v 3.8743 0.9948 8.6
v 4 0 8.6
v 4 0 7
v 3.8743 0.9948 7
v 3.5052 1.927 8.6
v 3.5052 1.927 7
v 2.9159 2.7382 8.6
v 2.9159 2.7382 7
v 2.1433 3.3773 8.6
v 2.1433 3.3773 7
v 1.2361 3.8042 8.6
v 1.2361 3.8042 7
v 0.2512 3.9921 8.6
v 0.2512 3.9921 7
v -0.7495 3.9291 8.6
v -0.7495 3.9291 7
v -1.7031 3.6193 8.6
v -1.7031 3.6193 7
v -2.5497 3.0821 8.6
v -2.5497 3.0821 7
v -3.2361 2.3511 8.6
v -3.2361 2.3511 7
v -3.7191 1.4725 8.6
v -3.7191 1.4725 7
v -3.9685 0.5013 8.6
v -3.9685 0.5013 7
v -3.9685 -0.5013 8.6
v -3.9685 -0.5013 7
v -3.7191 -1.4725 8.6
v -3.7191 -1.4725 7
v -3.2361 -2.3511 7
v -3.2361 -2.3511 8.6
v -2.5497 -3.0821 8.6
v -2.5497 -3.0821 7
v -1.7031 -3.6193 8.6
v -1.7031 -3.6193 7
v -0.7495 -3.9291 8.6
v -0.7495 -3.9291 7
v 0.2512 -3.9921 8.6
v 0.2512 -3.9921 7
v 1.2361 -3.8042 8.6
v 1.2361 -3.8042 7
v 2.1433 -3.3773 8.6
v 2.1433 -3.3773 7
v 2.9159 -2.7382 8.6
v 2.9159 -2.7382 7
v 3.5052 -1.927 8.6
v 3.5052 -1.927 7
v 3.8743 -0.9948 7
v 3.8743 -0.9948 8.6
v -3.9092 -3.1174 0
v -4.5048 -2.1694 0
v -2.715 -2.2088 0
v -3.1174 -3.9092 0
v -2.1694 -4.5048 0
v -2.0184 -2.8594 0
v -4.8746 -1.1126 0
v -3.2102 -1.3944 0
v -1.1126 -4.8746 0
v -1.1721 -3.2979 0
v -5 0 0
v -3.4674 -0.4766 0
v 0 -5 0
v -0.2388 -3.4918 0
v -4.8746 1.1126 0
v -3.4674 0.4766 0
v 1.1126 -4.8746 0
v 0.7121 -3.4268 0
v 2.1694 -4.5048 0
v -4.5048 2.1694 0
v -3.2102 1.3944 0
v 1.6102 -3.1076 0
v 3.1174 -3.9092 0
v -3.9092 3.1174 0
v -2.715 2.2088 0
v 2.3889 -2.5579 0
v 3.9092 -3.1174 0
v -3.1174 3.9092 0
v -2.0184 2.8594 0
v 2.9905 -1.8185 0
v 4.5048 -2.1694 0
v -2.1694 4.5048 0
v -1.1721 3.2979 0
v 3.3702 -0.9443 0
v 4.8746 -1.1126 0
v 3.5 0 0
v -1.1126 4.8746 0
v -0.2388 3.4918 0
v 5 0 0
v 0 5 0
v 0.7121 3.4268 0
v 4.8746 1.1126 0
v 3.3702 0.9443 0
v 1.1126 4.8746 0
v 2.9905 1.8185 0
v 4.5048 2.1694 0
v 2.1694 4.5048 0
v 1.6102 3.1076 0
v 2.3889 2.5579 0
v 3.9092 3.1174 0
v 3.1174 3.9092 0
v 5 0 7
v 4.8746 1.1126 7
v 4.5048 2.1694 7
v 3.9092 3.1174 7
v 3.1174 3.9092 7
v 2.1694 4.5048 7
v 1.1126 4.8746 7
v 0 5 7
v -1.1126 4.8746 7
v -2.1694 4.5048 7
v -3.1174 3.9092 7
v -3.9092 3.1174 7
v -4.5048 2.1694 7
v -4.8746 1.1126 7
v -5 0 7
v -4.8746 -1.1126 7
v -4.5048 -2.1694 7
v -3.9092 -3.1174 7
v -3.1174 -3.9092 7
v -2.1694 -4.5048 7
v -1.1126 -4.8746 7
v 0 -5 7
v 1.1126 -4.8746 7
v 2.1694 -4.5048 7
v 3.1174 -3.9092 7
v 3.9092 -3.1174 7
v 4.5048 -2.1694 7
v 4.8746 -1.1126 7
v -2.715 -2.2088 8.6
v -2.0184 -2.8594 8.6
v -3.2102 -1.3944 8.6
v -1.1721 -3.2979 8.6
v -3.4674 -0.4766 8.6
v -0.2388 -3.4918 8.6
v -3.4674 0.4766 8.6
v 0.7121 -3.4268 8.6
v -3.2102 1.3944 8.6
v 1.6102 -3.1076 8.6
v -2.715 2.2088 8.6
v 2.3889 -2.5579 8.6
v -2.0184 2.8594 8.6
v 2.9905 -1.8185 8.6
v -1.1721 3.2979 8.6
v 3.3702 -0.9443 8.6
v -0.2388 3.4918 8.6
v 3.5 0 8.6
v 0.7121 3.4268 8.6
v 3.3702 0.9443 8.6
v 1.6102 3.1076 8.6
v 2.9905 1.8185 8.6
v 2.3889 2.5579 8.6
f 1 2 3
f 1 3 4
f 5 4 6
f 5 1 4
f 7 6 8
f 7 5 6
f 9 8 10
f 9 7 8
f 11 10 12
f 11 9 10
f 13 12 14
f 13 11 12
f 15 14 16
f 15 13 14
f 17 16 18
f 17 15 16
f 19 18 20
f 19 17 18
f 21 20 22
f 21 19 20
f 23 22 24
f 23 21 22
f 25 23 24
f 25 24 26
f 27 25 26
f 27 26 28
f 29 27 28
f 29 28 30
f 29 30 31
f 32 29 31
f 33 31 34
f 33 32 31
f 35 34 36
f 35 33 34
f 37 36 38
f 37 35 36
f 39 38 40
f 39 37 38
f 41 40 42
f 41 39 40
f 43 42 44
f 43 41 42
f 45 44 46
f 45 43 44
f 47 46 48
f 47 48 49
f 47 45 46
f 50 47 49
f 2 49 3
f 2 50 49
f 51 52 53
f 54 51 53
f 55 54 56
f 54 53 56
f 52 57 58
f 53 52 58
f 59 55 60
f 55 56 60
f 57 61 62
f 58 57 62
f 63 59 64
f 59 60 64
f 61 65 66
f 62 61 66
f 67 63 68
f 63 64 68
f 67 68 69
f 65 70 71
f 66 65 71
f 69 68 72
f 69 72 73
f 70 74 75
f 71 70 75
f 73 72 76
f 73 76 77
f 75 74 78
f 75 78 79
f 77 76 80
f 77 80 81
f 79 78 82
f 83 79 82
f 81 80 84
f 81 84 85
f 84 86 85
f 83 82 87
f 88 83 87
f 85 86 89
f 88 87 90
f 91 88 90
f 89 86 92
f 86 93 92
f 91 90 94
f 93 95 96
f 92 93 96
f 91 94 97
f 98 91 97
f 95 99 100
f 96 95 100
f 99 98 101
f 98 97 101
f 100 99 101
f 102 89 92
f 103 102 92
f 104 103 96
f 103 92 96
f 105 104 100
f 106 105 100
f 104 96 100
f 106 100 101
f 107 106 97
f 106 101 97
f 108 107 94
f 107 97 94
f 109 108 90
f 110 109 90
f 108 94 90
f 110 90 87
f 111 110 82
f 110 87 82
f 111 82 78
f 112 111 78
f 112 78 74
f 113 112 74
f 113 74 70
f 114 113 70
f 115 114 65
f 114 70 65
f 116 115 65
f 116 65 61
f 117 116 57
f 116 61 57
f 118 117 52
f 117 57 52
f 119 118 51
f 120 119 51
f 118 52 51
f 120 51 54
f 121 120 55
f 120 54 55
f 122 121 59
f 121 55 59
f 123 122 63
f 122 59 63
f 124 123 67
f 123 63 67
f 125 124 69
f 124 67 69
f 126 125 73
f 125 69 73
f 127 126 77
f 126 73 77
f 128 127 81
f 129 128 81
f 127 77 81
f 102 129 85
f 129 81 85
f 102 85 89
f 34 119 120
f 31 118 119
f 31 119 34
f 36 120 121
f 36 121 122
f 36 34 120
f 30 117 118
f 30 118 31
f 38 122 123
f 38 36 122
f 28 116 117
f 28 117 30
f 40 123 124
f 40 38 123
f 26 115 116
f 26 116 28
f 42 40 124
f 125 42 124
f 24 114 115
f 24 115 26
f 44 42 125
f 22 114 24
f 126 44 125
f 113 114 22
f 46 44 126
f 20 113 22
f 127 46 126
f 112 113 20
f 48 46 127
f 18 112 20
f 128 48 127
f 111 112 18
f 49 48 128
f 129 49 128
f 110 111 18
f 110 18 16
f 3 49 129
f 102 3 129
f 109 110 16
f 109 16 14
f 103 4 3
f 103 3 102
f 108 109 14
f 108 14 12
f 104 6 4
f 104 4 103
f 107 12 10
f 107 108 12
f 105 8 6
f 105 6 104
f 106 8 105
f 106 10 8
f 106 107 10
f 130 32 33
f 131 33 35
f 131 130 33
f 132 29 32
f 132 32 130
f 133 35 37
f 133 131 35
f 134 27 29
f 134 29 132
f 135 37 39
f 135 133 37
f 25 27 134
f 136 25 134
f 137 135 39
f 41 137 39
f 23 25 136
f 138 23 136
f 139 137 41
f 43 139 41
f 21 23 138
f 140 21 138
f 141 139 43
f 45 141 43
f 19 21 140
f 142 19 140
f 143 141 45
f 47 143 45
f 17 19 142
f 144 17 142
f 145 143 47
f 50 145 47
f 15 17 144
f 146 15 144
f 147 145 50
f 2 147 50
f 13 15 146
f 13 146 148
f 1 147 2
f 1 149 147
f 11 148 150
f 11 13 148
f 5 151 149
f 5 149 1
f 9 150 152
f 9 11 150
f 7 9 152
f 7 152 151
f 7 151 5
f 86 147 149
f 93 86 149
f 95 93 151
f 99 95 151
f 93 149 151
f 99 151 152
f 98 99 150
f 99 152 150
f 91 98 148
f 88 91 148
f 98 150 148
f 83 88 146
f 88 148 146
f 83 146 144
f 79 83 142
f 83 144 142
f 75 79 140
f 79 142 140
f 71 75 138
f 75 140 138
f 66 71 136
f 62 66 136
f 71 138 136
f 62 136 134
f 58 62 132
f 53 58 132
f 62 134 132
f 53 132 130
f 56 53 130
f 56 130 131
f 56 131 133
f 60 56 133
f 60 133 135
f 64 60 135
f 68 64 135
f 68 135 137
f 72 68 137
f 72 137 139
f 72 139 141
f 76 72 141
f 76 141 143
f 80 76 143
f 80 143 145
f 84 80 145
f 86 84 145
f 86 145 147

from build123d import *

# Parameters (mm, degrees)
SKETCH1_R           = 5
BOSS_EXTRUDE1_DEPTH = 7
SKETCH2_R           = 3.5
CUT_EXTRUDE1_DEPTH  = 10.949874371
BOSS_EXTRUDE4_START = 1.6
SKETCH3_R           = 4
SKETCH3_R_2         = 3.5
BOSS_EXTRUDE4_DEPTH = 1.6


with BuildPart() as part:
    # Sketch1 → Boss-Extrude1 (new body)
    with BuildSketch(Plane.XY):
        Circle(SKETCH1_R)
    extrude(amount=BOSS_EXTRUDE1_DEPTH)

    # Sketch2 → Cut-Extrude1 (cut, through all)
    with BuildSketch(Plane.XY.offset(7)):
        Circle(SKETCH2_R)
    extrude(amount=-CUT_EXTRUDE1_DEPTH, mode=Mode.SUBTRACT)

    # Sketch3 → Boss-Extrude4 (add)
    with BuildSketch(Plane.XY.offset(7).offset(BOSS_EXTRUDE4_START)):
        Circle(SKETCH3_R)
        Circle(SKETCH3_R_2, mode=Mode.SUBTRACT)
    extrude(amount=-BOSS_EXTRUDE4_DEPTH)


solid = part.part
